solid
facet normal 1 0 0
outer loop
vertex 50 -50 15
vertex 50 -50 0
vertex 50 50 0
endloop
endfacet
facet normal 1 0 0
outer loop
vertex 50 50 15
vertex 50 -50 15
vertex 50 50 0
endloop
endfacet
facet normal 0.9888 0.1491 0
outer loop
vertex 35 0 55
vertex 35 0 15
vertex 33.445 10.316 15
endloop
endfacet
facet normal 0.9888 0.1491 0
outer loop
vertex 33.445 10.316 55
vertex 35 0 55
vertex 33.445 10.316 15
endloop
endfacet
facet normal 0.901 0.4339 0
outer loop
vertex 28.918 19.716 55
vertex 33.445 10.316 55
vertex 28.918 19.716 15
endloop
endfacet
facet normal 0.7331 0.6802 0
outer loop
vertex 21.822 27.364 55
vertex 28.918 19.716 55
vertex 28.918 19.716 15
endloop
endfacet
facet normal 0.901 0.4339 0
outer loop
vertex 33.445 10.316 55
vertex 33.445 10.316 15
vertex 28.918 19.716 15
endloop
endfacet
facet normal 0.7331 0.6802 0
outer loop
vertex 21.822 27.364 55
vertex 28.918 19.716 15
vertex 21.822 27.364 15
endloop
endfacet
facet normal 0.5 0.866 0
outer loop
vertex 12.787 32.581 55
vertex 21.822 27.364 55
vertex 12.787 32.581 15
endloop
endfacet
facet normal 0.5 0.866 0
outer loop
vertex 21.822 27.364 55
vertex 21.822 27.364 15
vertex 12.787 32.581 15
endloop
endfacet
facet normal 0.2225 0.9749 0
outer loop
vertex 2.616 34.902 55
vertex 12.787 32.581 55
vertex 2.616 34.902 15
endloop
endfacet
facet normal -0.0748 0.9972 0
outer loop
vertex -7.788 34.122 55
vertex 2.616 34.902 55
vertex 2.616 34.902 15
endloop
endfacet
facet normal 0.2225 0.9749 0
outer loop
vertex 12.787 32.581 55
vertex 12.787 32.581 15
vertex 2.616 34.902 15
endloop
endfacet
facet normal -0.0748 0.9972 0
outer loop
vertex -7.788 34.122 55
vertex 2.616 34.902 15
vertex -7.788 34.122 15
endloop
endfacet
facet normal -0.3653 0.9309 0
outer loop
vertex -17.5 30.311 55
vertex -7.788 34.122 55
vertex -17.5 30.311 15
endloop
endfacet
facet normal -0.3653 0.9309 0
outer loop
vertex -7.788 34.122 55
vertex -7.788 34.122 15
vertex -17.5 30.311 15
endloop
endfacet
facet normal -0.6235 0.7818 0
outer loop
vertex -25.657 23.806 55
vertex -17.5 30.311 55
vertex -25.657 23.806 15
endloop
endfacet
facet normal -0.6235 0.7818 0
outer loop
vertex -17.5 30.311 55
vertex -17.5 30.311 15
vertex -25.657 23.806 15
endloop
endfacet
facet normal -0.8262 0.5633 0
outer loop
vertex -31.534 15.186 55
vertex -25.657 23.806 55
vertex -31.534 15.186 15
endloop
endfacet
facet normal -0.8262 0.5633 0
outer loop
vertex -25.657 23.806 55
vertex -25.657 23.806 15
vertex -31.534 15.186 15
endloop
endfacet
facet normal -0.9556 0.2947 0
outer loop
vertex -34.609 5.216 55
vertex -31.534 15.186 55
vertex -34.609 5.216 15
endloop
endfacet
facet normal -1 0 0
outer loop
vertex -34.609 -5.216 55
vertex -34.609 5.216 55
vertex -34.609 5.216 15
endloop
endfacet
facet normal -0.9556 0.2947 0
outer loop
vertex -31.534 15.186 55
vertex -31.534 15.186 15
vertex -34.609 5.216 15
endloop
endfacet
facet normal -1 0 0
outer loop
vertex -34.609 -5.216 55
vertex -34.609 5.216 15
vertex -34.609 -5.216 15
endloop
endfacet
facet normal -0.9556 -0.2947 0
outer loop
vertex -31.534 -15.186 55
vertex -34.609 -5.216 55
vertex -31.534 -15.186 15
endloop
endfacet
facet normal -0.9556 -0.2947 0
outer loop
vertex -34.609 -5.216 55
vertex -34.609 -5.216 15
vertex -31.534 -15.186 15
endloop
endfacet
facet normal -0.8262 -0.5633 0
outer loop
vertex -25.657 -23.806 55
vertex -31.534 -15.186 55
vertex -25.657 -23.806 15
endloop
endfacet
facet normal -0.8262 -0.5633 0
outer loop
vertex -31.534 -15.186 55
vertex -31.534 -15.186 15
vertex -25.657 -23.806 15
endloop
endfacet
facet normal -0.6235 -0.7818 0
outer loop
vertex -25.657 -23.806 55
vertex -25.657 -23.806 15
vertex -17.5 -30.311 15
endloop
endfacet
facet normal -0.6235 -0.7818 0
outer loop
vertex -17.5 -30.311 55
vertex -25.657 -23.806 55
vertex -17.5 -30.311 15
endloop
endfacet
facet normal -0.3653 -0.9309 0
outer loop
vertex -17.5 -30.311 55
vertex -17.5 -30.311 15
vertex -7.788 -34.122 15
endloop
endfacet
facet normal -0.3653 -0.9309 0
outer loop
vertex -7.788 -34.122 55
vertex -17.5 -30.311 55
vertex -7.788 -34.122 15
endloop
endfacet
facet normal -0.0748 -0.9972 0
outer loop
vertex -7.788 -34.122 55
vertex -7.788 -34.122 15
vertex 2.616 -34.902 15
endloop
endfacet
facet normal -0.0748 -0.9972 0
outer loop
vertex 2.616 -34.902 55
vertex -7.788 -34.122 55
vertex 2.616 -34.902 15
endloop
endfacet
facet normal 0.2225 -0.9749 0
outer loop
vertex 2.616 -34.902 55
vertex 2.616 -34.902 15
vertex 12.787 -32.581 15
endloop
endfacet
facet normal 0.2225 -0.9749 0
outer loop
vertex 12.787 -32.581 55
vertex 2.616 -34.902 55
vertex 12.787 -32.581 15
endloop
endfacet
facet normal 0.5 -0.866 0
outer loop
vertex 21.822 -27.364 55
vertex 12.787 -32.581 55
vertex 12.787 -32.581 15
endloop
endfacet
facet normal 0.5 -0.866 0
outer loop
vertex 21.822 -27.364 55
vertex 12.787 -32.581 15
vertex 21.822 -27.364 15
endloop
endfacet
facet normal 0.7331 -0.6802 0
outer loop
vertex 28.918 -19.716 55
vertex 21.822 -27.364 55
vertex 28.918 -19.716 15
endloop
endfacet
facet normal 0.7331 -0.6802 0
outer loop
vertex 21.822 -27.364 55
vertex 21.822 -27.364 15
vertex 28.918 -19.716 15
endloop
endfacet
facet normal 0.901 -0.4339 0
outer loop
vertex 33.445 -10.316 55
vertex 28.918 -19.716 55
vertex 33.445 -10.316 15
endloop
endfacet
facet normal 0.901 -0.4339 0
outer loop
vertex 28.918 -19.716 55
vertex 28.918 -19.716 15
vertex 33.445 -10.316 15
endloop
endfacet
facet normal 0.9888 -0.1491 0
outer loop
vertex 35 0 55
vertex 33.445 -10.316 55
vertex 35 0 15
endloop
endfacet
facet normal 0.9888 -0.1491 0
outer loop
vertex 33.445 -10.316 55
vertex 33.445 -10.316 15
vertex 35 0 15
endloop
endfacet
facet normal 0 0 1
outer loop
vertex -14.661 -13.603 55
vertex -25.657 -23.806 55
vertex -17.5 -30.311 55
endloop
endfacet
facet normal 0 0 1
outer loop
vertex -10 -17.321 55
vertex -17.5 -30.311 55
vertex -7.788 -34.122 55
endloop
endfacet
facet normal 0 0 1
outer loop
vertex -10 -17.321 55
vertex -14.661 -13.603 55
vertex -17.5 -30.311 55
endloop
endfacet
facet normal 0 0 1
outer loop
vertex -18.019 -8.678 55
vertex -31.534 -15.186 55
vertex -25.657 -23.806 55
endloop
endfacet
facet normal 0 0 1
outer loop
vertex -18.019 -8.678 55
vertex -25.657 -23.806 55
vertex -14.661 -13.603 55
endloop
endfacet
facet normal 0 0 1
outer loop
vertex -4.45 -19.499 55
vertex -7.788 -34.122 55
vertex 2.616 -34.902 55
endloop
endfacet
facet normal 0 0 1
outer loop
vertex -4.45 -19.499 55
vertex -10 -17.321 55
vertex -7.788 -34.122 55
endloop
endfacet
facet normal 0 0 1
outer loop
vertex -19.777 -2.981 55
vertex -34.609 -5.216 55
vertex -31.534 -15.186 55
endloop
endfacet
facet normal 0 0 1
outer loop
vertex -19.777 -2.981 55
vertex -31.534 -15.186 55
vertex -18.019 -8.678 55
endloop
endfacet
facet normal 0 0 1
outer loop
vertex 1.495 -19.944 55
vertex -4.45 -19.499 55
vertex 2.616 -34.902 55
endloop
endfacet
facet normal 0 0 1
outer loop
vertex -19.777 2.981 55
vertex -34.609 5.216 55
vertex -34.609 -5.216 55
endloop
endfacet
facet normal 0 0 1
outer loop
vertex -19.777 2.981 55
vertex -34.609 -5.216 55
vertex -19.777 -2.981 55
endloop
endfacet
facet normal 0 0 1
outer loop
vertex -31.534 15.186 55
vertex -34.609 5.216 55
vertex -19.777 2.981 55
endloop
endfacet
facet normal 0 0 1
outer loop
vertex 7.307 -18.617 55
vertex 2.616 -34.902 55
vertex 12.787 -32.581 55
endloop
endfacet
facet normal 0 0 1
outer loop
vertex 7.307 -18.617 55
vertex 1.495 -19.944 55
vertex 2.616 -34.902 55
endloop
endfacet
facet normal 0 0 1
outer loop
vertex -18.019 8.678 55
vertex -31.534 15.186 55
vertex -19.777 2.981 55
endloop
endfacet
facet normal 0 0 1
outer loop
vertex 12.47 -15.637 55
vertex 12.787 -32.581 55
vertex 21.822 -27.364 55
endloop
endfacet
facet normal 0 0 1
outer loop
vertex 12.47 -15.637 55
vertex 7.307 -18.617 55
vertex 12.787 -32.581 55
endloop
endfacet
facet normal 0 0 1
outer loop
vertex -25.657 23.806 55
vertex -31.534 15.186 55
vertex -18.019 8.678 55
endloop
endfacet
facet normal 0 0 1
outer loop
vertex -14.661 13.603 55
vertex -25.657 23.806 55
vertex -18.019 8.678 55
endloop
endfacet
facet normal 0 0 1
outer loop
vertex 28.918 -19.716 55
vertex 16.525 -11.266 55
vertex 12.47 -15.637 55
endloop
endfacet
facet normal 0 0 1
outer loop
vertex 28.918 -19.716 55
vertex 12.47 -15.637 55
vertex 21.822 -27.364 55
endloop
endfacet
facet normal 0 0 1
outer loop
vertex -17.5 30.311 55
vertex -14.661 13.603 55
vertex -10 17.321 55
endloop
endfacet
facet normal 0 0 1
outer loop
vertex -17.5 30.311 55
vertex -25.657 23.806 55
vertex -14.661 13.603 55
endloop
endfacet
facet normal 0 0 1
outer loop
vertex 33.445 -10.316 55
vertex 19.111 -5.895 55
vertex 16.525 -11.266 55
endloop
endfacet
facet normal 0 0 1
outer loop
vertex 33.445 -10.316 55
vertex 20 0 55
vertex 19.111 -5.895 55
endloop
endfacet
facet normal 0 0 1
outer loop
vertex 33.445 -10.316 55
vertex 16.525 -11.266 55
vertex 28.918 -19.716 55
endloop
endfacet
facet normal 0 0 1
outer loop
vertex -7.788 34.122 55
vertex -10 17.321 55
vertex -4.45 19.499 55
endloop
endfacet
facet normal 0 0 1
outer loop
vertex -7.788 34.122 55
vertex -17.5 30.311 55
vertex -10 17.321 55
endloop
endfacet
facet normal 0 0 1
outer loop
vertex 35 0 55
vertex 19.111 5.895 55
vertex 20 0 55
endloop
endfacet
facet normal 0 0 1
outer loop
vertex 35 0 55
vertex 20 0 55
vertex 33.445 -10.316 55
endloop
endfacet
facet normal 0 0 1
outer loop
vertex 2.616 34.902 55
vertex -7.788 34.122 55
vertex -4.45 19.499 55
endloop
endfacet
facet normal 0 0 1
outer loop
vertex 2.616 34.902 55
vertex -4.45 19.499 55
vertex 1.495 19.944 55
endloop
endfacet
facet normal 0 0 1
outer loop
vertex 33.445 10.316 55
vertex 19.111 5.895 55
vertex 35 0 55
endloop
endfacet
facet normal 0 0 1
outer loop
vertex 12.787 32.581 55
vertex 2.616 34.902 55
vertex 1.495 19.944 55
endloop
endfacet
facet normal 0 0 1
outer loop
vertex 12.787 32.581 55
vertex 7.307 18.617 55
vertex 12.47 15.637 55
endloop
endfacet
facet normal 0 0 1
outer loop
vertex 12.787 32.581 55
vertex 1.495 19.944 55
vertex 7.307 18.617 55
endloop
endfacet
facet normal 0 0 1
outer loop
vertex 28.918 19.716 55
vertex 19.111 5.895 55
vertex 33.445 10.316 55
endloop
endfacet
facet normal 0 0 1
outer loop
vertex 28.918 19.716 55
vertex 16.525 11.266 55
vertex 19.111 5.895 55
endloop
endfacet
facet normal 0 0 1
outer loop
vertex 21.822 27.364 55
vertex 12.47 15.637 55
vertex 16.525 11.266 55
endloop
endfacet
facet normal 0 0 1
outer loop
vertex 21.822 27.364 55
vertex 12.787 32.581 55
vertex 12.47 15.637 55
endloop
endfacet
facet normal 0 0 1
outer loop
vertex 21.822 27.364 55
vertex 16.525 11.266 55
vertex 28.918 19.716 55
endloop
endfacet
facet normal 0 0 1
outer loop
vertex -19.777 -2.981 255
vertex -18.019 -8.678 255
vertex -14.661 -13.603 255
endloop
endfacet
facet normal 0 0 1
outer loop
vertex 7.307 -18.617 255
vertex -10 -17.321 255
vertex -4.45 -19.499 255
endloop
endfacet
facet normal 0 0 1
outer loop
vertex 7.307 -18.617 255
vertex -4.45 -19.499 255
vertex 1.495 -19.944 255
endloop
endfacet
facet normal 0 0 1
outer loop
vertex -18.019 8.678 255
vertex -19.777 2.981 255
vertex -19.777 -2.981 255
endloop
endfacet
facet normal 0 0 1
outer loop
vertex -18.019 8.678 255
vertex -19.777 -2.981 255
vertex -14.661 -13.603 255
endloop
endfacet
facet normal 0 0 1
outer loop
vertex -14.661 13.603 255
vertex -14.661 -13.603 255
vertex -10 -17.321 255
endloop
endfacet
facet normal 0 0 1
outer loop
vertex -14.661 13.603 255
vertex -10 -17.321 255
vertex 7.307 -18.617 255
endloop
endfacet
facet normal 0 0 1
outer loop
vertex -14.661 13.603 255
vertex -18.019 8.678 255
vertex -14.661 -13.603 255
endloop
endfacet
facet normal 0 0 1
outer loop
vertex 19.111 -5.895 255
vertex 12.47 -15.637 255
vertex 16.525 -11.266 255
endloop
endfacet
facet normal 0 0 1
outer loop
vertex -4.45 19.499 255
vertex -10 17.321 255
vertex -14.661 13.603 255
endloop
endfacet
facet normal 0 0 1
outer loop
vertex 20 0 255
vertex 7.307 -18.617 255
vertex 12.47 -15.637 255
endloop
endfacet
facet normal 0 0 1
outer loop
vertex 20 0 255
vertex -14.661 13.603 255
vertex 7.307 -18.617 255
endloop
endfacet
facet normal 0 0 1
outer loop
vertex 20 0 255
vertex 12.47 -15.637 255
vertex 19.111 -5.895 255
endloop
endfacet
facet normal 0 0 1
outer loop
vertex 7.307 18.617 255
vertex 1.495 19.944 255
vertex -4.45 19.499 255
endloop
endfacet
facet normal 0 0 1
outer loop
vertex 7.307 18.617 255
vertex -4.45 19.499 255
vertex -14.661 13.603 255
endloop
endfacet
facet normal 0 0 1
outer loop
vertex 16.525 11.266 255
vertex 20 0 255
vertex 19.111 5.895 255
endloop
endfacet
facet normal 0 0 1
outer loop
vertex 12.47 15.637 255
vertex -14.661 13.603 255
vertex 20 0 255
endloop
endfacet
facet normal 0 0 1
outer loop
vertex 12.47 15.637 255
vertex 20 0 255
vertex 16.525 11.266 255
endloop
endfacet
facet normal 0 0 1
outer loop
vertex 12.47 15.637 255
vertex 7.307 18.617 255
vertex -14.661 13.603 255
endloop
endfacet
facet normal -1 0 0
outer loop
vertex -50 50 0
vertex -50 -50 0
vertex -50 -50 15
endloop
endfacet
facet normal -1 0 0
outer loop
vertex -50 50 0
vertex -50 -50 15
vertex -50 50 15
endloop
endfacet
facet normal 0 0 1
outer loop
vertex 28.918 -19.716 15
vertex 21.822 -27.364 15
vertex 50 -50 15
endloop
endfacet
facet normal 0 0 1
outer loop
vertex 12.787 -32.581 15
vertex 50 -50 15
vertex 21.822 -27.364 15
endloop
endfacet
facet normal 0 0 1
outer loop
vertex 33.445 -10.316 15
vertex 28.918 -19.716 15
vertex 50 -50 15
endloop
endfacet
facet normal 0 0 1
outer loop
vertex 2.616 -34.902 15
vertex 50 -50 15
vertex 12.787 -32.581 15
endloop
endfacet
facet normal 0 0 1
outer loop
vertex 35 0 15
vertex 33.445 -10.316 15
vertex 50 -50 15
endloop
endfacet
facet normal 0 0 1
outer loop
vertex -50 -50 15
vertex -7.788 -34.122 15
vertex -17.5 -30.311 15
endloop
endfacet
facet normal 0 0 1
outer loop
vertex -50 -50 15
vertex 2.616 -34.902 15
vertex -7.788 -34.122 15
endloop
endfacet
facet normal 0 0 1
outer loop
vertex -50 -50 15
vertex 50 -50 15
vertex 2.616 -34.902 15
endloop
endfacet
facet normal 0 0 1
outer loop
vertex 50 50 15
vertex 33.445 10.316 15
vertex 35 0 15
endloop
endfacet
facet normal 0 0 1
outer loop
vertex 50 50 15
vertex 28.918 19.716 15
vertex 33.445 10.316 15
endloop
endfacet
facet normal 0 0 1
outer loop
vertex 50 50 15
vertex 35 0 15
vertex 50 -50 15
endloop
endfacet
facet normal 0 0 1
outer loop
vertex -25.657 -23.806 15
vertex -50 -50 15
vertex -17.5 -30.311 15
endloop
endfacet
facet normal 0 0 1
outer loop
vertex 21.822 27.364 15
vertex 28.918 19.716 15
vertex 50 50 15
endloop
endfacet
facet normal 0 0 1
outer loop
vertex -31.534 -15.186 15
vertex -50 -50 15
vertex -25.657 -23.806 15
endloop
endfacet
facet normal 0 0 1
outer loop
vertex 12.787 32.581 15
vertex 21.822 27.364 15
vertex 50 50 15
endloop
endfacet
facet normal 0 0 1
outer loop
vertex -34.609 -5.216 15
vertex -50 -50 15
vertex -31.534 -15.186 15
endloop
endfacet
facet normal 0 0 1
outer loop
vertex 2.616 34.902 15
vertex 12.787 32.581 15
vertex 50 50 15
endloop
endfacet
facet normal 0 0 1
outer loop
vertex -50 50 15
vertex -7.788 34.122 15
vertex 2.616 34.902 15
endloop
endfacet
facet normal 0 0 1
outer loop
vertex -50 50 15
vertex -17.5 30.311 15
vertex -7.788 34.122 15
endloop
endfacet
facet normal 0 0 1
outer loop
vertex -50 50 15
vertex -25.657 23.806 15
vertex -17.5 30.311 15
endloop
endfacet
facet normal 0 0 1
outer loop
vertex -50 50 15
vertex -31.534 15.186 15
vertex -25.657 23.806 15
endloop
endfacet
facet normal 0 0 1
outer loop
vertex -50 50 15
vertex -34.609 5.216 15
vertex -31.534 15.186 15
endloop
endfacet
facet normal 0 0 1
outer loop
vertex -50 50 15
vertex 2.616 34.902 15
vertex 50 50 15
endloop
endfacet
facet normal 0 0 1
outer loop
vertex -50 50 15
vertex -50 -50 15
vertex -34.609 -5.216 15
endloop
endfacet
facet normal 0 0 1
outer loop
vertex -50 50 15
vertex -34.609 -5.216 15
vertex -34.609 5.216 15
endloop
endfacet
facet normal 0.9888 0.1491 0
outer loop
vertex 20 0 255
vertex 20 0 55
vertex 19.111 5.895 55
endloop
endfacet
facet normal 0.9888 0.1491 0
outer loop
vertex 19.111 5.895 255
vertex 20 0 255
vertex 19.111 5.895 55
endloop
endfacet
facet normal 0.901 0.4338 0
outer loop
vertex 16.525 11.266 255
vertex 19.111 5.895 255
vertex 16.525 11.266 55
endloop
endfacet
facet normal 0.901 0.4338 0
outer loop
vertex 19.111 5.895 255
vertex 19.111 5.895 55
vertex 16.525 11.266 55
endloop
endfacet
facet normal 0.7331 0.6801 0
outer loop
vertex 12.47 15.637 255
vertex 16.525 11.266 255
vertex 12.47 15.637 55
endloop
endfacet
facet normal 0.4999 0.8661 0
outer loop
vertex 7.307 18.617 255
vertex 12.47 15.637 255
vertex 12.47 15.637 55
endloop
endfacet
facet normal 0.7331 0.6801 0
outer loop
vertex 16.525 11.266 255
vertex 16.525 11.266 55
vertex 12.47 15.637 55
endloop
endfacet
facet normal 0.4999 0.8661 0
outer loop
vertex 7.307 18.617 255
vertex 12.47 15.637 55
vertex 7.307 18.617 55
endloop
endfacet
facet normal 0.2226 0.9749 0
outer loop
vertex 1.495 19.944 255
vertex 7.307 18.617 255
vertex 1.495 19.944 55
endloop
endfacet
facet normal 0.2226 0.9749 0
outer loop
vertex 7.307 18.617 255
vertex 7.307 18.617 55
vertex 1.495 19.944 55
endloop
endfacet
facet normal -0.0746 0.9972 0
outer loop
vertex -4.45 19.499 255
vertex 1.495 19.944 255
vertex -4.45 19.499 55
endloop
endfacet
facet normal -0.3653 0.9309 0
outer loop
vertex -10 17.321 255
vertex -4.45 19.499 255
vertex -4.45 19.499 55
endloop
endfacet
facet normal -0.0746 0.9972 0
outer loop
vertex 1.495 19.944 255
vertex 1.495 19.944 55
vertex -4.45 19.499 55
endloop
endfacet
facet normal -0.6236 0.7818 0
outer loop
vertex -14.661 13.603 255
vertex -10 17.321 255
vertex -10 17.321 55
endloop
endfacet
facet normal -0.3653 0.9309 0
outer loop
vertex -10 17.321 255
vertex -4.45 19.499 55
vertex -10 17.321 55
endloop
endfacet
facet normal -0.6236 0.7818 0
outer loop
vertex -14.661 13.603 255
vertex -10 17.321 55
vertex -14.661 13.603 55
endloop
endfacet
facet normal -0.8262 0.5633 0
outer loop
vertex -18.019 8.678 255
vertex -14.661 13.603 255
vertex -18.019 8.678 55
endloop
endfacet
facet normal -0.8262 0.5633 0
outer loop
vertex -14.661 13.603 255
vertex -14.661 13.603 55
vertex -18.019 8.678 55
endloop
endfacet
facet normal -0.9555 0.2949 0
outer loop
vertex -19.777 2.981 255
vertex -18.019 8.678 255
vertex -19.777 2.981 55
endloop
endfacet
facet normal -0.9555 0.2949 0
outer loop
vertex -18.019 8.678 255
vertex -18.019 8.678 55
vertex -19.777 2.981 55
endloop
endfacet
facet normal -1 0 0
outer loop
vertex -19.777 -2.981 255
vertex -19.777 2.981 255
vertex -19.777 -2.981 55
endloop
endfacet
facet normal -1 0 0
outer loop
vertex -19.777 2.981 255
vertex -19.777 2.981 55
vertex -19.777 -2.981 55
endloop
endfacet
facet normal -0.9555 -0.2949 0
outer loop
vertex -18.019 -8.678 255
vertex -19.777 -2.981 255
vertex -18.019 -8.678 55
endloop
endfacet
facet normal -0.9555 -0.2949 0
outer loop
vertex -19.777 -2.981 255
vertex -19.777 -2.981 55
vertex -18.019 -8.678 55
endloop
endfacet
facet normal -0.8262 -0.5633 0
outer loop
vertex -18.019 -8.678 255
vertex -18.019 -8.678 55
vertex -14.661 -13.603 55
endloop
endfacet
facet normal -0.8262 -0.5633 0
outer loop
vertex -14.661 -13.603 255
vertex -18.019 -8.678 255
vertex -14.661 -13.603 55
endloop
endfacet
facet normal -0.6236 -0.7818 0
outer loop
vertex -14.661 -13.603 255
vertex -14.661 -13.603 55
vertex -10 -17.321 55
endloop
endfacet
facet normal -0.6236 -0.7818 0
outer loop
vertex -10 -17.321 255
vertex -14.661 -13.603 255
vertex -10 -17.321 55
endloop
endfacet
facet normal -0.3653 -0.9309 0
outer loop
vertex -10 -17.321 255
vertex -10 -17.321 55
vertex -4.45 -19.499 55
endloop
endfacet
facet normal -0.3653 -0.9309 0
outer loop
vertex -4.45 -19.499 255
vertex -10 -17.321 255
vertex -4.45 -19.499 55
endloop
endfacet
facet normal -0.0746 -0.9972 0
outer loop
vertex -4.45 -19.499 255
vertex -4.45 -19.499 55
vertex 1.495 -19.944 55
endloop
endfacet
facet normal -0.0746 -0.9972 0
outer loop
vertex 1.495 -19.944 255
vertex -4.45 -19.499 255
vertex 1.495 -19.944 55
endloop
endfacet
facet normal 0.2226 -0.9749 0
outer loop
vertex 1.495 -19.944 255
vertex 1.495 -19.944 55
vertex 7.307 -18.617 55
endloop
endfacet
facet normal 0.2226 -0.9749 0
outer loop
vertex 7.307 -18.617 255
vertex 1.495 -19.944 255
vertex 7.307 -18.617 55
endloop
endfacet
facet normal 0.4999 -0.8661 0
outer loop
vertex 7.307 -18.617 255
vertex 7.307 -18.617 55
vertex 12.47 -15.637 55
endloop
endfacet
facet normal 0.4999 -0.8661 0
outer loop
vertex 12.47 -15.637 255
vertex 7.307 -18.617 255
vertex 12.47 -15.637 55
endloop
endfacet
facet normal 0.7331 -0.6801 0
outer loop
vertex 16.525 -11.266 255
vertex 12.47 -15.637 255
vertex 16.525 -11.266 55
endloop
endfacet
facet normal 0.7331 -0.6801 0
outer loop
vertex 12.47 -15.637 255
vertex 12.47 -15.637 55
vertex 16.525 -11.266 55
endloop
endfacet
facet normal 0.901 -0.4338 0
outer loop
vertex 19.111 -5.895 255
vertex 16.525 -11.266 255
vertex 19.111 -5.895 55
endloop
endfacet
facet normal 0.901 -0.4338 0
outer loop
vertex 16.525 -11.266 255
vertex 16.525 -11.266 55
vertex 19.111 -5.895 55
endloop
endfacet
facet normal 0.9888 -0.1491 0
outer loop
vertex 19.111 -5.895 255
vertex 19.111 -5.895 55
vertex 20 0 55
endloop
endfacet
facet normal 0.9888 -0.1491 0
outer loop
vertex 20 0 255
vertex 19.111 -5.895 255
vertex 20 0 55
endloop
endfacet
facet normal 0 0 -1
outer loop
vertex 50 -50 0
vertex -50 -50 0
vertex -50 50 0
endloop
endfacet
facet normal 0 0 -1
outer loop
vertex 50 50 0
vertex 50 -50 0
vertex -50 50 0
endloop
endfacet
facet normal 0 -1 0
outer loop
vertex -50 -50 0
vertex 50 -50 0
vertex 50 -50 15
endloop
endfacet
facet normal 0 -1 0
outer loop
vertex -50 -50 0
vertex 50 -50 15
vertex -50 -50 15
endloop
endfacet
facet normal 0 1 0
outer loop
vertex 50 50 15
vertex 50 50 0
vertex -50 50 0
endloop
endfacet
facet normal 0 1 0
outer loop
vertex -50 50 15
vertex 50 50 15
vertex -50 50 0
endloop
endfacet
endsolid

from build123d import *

# Parameters (mm, degrees)
F_1_BASE_W               = 100
F_1_BASE_H               = 100
RESSALTO_EXTRUS_O1_DEPTH = 15
F_2_BASE_EIXO_R          = 35
RESSALTO_EXTRUS_O2_DEPTH = 40
ESBO_O3_R                = 20
RESSALTO_EXTRUS_O3_DEPTH = 200


with BuildPart() as part:
    # 1_Base → Ressalto-extrusão1 (new body)
    with BuildSketch(Plane(origin=(0, 0, 0), x_dir=(0, 1, 0), z_dir=(0, 0, 1))):
        Rectangle(F_1_BASE_W, F_1_BASE_H)
    extrude(amount=RESSALTO_EXTRUS_O1_DEPTH)

    # 2_Base_eixo → Ressalto-extrusão2 (add)
    with BuildSketch(Plane.XY.offset(15)):
        Circle(F_2_BASE_EIXO_R)
    extrude(amount=RESSALTO_EXTRUS_O2_DEPTH)

    # Esboço3 → Ressalto-extrusão3 (add)
    with BuildSketch(Plane.XY.offset(55)):
        Circle(ESBO_O3_R)
    extrude(amount=RESSALTO_EXTRUS_O3_DEPTH)


solid = part.part
